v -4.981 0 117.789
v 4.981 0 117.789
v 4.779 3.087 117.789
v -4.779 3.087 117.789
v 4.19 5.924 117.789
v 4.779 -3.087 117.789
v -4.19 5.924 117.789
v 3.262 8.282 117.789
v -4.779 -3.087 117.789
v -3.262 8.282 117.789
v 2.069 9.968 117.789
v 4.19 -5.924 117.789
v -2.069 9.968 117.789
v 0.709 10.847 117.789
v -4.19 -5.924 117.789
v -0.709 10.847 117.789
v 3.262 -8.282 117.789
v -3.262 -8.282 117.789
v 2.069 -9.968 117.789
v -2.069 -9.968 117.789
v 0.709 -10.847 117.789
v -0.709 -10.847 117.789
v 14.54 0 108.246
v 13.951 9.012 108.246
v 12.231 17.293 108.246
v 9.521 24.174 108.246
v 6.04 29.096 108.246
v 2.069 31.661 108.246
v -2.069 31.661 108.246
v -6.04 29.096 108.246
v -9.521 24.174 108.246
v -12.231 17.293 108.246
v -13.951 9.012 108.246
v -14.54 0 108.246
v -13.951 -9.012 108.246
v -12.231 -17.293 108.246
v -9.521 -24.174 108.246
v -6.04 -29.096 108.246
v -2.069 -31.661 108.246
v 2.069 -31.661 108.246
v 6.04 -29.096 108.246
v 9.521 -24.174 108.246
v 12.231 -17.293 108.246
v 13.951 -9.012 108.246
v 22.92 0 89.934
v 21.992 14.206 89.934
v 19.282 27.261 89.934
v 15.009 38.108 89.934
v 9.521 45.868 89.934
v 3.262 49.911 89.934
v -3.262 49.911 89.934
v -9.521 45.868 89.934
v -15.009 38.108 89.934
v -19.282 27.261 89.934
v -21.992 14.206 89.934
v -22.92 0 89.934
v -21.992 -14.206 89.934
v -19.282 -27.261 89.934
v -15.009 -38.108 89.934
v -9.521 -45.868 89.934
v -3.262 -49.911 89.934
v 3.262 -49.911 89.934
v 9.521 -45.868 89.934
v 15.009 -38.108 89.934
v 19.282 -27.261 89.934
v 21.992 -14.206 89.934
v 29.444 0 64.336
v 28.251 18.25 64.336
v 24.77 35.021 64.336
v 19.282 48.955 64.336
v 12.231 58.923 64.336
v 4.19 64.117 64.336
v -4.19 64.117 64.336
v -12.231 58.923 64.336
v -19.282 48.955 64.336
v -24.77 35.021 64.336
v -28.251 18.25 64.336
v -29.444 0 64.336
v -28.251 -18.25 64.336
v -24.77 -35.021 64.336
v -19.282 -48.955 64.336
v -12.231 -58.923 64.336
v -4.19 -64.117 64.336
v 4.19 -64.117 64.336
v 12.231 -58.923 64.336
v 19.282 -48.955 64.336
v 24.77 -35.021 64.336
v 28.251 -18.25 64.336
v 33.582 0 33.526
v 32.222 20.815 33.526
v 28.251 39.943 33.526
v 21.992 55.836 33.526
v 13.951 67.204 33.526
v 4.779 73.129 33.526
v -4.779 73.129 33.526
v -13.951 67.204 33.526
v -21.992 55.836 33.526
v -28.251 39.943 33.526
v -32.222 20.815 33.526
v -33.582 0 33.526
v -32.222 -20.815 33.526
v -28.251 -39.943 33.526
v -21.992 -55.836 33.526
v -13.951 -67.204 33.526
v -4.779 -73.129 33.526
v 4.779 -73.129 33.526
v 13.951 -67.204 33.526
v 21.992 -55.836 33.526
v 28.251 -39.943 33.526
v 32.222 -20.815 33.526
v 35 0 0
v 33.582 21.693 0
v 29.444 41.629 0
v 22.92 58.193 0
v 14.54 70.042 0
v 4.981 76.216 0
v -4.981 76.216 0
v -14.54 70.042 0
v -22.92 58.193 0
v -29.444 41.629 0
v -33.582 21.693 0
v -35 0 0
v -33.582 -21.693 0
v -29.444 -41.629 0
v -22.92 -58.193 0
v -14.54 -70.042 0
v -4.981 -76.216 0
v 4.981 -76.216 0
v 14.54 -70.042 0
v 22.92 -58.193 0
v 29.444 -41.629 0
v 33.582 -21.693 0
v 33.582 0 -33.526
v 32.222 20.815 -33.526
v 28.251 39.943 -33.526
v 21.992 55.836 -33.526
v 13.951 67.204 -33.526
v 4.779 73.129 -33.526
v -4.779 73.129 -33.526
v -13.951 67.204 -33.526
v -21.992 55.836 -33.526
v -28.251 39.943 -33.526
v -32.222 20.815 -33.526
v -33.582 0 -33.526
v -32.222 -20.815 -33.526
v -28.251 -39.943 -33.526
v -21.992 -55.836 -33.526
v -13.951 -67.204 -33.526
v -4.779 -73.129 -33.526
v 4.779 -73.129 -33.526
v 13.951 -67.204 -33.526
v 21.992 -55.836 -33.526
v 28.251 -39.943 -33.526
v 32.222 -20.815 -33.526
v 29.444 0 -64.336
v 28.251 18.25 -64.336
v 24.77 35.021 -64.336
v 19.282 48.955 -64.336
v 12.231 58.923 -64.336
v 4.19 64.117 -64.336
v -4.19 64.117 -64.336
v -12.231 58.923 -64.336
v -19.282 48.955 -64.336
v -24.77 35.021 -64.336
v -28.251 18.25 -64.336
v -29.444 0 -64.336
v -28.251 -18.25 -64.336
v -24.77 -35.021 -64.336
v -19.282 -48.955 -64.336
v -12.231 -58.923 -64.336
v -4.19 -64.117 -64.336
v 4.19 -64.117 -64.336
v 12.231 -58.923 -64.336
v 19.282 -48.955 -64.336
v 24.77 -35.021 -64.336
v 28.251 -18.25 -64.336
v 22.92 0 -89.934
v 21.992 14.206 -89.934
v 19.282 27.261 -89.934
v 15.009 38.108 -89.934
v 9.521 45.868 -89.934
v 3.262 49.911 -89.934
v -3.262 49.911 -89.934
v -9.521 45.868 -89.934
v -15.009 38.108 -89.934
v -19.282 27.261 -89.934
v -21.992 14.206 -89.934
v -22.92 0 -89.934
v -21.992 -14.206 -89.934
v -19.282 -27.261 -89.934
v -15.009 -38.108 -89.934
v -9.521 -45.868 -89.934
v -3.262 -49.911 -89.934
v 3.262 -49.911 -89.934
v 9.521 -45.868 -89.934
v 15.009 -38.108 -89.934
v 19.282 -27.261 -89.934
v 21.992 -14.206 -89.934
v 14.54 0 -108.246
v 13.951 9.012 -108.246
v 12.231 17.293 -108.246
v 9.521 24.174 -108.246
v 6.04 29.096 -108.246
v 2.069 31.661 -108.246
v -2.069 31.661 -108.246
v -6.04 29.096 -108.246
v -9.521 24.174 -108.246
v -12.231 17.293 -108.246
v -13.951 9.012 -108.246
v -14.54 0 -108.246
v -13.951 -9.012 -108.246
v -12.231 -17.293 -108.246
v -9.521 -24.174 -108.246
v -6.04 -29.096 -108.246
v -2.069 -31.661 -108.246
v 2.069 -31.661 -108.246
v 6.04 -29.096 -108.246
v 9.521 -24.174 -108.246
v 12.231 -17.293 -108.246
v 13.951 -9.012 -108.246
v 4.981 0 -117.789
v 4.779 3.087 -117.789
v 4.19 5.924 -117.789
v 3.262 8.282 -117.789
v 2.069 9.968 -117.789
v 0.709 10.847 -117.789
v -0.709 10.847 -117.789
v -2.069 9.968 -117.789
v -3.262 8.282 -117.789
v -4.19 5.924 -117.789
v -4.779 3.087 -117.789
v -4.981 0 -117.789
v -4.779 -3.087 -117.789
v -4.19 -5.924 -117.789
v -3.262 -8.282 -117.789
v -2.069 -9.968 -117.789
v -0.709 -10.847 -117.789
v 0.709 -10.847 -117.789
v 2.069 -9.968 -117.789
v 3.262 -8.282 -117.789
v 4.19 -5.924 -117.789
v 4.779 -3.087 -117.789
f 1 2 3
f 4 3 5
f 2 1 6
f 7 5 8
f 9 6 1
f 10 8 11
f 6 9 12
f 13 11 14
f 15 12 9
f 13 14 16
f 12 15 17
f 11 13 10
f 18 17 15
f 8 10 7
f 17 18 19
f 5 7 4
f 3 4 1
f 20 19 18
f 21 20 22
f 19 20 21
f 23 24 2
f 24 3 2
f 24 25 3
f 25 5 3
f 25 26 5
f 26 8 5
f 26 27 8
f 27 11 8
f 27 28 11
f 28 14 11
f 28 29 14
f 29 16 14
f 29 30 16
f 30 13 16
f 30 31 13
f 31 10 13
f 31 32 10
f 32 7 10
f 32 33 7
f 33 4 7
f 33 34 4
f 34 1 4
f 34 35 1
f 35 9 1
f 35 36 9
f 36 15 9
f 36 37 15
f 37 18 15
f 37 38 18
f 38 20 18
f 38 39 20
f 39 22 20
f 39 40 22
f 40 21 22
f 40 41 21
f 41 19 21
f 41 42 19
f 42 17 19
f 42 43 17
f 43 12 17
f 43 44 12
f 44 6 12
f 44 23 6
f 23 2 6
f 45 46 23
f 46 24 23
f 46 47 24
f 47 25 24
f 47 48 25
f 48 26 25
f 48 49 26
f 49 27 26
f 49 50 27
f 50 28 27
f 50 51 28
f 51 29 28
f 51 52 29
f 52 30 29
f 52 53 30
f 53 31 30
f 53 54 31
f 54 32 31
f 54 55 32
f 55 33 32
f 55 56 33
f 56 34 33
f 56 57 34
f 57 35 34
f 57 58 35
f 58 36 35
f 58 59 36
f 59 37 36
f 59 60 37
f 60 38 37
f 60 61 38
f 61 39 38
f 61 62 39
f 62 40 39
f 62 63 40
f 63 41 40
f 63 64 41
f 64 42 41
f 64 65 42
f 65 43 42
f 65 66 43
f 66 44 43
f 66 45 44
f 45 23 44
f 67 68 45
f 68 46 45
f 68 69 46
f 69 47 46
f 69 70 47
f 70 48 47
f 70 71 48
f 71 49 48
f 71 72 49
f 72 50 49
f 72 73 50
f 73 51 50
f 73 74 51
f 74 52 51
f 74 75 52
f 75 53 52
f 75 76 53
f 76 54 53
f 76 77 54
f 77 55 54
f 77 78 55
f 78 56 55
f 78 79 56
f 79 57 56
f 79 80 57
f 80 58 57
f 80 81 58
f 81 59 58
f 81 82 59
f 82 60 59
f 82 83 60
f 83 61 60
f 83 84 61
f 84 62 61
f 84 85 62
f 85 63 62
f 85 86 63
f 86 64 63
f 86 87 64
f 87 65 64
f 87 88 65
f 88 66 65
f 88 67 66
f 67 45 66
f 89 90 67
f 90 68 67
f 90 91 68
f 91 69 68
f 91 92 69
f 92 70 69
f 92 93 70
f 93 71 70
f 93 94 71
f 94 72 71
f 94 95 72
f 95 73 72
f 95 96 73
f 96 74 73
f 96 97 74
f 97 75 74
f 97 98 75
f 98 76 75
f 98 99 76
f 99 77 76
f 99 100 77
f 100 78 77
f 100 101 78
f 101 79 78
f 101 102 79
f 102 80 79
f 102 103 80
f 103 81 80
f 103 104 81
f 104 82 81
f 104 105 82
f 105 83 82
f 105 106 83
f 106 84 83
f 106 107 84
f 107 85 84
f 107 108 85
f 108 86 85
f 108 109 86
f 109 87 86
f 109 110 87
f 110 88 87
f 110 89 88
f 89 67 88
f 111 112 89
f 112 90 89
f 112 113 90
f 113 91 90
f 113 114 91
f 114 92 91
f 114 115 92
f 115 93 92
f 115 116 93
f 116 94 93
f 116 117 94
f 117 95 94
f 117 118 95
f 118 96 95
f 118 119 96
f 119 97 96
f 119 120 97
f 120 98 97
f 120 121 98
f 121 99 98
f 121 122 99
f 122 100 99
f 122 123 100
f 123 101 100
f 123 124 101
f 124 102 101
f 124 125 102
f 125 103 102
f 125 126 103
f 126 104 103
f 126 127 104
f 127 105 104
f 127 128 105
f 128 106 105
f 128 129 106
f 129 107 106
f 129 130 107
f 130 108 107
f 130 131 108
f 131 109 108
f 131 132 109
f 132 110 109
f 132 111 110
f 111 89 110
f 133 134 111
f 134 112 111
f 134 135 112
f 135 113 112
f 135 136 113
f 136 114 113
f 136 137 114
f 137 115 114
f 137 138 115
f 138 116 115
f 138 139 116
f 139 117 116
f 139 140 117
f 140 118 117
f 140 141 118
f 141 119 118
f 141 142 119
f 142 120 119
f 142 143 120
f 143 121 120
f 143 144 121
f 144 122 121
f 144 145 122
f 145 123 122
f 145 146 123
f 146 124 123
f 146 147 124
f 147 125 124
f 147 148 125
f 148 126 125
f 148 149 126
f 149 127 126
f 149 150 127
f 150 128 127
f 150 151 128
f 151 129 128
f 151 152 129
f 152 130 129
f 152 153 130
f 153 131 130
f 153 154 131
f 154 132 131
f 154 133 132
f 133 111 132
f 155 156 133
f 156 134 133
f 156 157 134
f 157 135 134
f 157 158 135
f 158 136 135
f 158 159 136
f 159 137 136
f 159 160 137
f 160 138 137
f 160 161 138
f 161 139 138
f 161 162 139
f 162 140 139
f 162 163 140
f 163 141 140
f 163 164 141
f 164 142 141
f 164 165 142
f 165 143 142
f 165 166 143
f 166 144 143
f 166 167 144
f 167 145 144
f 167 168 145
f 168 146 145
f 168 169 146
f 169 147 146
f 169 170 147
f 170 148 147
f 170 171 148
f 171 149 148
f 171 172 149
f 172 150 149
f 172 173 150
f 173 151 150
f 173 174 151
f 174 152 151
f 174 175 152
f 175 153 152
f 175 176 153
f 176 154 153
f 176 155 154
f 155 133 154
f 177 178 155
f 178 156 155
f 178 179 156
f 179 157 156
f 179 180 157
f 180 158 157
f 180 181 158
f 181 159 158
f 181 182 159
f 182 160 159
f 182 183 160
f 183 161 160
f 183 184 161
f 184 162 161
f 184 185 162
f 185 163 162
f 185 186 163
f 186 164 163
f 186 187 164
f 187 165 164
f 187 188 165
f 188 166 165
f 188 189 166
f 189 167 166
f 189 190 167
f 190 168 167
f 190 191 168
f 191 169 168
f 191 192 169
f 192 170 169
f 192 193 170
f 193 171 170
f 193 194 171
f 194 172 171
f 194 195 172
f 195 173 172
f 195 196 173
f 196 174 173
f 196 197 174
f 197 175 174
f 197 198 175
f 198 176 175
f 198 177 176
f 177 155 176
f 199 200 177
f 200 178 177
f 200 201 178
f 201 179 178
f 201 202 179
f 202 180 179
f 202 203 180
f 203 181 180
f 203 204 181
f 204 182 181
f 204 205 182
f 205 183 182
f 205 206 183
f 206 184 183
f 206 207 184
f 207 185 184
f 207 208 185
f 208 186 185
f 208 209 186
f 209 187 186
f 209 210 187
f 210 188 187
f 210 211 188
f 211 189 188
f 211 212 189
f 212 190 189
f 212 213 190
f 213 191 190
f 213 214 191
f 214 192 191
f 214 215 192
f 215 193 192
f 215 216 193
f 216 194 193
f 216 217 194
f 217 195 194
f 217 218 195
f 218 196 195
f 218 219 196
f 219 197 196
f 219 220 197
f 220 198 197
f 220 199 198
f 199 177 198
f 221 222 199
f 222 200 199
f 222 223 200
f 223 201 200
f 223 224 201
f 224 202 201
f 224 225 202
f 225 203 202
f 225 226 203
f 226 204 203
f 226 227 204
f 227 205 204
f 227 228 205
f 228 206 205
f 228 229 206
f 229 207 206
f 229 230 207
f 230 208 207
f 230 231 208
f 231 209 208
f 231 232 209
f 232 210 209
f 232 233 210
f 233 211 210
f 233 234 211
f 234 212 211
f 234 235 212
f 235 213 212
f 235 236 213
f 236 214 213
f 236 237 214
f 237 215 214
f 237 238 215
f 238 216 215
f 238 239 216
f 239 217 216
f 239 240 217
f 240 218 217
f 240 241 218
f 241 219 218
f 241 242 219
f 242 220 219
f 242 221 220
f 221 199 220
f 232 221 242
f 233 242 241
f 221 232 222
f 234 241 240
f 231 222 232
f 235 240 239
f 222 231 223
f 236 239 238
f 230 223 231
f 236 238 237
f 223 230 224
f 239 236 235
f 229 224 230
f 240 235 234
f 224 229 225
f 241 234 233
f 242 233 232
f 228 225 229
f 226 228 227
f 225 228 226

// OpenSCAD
// Generated by SolidPython 1.0.1 on 2020-07-29 00:46:46


scale(v = [5, 11, 17]) {
	sphere(r = 7);
}
/***********************************************
*********      SolidPython code:      **********
************************************************
 
# import packages: SolidPython
from solid import *
from solid.utils import *
from itertools import chain, combinations, permutations


class Resize:

    def __init__(self, scad_file):
        self.scad_file = scad_file
        #self.scad_file = import_scad(scad_file)
        # cone/cylinder param:
        self.r1 = 0
        self.r2 = 0
        self.h = 0
        # rectangular prism param:
        self.w = 0
        self.l = 0
        # ellipse param:
        self.r = 0

    # import OpenScad code (file name corresponds to shape)


    # classify shape + parameters
    def assign(self, param1, param2, param3):
        if self.scad_file == 'cone.scad':
            self.r1 = param1
            self.r2 = param2
            self.h = param3
        elif self.scad_file == 'cylinder.scad':
            self.r1 = param1
            self.r2 = param2
            self.h = param3
        elif self.scad_file == 'rectangularPrism.scad':
            self.h = param1
            self.l = param2
            self.w = param3
        else:
            self.r = param1
            self.h = param2

    # resize parameters
    def iterate(self):
        x = range(3, 20, 2)
        i = 1
        if self.scad_file == 'cone.scad':
            tempList = list(permutations(x, 2))
            for temp in tempList:
                param1 = temp[0]
                param2 = temp[1]
                filepath = 'produced_scad_files/' + 'cone' + str(param1) + '_' + str(param2) + '_' + '.scad'
                scad_render_to_file(cylinder(h=param1, r1=param2, r2=0), filepath)

        elif self.scad_file == 'cylinder.scad':
            tempList = list(permutations(x, 3))
            for temp in tempList:
                param1 = temp[0]
                param2 = temp[1]
                filepath = 'produced_scad_files/' + 'cylinder' + str(param1) + '_' + str(param2) + '_' + '.scad'
                scad_render_to_file(cylinder(h=param1, r1=param2, r2=param2), filepath)

        elif self.scad_file == 'rectangularPrism.scad':
            tempList = list(permutations(x, 3))
            for temp in tempList:
                param1 = temp[0]
                param2 = temp[1]
                param3 = temp[2]
                filepath = 'produced_scad_files/' + 'rectangularPrism' + str(param1) + '_' + str(param2) + '_' + str(
                    param3) + '.scad'
                scad_render_to_file(cube(size=(param1, param2, param3)), filepath)

        elif self.scad_file == 'ellipse.scad':
            tempList = list(permutations(x, 4))
            for temp in tempList:
                param1 = temp[0]
                param2 = temp[1]
                param3 = temp[2]
                param4 = temp[3]
                filepath = 'produced_scad_files/' + 'ellipse' + str(param1) + '_' + str(param2) + '_' + str(param3) + '_' + str(param4) + '.scad'
                scad_render_to_file(scale([param1, param2, param3])(sphere(r=param4)), filepath)

    def render_to_scadfile(self):
        scad_render_to_file(scad, 'example.scad') 
 
************************************************/
